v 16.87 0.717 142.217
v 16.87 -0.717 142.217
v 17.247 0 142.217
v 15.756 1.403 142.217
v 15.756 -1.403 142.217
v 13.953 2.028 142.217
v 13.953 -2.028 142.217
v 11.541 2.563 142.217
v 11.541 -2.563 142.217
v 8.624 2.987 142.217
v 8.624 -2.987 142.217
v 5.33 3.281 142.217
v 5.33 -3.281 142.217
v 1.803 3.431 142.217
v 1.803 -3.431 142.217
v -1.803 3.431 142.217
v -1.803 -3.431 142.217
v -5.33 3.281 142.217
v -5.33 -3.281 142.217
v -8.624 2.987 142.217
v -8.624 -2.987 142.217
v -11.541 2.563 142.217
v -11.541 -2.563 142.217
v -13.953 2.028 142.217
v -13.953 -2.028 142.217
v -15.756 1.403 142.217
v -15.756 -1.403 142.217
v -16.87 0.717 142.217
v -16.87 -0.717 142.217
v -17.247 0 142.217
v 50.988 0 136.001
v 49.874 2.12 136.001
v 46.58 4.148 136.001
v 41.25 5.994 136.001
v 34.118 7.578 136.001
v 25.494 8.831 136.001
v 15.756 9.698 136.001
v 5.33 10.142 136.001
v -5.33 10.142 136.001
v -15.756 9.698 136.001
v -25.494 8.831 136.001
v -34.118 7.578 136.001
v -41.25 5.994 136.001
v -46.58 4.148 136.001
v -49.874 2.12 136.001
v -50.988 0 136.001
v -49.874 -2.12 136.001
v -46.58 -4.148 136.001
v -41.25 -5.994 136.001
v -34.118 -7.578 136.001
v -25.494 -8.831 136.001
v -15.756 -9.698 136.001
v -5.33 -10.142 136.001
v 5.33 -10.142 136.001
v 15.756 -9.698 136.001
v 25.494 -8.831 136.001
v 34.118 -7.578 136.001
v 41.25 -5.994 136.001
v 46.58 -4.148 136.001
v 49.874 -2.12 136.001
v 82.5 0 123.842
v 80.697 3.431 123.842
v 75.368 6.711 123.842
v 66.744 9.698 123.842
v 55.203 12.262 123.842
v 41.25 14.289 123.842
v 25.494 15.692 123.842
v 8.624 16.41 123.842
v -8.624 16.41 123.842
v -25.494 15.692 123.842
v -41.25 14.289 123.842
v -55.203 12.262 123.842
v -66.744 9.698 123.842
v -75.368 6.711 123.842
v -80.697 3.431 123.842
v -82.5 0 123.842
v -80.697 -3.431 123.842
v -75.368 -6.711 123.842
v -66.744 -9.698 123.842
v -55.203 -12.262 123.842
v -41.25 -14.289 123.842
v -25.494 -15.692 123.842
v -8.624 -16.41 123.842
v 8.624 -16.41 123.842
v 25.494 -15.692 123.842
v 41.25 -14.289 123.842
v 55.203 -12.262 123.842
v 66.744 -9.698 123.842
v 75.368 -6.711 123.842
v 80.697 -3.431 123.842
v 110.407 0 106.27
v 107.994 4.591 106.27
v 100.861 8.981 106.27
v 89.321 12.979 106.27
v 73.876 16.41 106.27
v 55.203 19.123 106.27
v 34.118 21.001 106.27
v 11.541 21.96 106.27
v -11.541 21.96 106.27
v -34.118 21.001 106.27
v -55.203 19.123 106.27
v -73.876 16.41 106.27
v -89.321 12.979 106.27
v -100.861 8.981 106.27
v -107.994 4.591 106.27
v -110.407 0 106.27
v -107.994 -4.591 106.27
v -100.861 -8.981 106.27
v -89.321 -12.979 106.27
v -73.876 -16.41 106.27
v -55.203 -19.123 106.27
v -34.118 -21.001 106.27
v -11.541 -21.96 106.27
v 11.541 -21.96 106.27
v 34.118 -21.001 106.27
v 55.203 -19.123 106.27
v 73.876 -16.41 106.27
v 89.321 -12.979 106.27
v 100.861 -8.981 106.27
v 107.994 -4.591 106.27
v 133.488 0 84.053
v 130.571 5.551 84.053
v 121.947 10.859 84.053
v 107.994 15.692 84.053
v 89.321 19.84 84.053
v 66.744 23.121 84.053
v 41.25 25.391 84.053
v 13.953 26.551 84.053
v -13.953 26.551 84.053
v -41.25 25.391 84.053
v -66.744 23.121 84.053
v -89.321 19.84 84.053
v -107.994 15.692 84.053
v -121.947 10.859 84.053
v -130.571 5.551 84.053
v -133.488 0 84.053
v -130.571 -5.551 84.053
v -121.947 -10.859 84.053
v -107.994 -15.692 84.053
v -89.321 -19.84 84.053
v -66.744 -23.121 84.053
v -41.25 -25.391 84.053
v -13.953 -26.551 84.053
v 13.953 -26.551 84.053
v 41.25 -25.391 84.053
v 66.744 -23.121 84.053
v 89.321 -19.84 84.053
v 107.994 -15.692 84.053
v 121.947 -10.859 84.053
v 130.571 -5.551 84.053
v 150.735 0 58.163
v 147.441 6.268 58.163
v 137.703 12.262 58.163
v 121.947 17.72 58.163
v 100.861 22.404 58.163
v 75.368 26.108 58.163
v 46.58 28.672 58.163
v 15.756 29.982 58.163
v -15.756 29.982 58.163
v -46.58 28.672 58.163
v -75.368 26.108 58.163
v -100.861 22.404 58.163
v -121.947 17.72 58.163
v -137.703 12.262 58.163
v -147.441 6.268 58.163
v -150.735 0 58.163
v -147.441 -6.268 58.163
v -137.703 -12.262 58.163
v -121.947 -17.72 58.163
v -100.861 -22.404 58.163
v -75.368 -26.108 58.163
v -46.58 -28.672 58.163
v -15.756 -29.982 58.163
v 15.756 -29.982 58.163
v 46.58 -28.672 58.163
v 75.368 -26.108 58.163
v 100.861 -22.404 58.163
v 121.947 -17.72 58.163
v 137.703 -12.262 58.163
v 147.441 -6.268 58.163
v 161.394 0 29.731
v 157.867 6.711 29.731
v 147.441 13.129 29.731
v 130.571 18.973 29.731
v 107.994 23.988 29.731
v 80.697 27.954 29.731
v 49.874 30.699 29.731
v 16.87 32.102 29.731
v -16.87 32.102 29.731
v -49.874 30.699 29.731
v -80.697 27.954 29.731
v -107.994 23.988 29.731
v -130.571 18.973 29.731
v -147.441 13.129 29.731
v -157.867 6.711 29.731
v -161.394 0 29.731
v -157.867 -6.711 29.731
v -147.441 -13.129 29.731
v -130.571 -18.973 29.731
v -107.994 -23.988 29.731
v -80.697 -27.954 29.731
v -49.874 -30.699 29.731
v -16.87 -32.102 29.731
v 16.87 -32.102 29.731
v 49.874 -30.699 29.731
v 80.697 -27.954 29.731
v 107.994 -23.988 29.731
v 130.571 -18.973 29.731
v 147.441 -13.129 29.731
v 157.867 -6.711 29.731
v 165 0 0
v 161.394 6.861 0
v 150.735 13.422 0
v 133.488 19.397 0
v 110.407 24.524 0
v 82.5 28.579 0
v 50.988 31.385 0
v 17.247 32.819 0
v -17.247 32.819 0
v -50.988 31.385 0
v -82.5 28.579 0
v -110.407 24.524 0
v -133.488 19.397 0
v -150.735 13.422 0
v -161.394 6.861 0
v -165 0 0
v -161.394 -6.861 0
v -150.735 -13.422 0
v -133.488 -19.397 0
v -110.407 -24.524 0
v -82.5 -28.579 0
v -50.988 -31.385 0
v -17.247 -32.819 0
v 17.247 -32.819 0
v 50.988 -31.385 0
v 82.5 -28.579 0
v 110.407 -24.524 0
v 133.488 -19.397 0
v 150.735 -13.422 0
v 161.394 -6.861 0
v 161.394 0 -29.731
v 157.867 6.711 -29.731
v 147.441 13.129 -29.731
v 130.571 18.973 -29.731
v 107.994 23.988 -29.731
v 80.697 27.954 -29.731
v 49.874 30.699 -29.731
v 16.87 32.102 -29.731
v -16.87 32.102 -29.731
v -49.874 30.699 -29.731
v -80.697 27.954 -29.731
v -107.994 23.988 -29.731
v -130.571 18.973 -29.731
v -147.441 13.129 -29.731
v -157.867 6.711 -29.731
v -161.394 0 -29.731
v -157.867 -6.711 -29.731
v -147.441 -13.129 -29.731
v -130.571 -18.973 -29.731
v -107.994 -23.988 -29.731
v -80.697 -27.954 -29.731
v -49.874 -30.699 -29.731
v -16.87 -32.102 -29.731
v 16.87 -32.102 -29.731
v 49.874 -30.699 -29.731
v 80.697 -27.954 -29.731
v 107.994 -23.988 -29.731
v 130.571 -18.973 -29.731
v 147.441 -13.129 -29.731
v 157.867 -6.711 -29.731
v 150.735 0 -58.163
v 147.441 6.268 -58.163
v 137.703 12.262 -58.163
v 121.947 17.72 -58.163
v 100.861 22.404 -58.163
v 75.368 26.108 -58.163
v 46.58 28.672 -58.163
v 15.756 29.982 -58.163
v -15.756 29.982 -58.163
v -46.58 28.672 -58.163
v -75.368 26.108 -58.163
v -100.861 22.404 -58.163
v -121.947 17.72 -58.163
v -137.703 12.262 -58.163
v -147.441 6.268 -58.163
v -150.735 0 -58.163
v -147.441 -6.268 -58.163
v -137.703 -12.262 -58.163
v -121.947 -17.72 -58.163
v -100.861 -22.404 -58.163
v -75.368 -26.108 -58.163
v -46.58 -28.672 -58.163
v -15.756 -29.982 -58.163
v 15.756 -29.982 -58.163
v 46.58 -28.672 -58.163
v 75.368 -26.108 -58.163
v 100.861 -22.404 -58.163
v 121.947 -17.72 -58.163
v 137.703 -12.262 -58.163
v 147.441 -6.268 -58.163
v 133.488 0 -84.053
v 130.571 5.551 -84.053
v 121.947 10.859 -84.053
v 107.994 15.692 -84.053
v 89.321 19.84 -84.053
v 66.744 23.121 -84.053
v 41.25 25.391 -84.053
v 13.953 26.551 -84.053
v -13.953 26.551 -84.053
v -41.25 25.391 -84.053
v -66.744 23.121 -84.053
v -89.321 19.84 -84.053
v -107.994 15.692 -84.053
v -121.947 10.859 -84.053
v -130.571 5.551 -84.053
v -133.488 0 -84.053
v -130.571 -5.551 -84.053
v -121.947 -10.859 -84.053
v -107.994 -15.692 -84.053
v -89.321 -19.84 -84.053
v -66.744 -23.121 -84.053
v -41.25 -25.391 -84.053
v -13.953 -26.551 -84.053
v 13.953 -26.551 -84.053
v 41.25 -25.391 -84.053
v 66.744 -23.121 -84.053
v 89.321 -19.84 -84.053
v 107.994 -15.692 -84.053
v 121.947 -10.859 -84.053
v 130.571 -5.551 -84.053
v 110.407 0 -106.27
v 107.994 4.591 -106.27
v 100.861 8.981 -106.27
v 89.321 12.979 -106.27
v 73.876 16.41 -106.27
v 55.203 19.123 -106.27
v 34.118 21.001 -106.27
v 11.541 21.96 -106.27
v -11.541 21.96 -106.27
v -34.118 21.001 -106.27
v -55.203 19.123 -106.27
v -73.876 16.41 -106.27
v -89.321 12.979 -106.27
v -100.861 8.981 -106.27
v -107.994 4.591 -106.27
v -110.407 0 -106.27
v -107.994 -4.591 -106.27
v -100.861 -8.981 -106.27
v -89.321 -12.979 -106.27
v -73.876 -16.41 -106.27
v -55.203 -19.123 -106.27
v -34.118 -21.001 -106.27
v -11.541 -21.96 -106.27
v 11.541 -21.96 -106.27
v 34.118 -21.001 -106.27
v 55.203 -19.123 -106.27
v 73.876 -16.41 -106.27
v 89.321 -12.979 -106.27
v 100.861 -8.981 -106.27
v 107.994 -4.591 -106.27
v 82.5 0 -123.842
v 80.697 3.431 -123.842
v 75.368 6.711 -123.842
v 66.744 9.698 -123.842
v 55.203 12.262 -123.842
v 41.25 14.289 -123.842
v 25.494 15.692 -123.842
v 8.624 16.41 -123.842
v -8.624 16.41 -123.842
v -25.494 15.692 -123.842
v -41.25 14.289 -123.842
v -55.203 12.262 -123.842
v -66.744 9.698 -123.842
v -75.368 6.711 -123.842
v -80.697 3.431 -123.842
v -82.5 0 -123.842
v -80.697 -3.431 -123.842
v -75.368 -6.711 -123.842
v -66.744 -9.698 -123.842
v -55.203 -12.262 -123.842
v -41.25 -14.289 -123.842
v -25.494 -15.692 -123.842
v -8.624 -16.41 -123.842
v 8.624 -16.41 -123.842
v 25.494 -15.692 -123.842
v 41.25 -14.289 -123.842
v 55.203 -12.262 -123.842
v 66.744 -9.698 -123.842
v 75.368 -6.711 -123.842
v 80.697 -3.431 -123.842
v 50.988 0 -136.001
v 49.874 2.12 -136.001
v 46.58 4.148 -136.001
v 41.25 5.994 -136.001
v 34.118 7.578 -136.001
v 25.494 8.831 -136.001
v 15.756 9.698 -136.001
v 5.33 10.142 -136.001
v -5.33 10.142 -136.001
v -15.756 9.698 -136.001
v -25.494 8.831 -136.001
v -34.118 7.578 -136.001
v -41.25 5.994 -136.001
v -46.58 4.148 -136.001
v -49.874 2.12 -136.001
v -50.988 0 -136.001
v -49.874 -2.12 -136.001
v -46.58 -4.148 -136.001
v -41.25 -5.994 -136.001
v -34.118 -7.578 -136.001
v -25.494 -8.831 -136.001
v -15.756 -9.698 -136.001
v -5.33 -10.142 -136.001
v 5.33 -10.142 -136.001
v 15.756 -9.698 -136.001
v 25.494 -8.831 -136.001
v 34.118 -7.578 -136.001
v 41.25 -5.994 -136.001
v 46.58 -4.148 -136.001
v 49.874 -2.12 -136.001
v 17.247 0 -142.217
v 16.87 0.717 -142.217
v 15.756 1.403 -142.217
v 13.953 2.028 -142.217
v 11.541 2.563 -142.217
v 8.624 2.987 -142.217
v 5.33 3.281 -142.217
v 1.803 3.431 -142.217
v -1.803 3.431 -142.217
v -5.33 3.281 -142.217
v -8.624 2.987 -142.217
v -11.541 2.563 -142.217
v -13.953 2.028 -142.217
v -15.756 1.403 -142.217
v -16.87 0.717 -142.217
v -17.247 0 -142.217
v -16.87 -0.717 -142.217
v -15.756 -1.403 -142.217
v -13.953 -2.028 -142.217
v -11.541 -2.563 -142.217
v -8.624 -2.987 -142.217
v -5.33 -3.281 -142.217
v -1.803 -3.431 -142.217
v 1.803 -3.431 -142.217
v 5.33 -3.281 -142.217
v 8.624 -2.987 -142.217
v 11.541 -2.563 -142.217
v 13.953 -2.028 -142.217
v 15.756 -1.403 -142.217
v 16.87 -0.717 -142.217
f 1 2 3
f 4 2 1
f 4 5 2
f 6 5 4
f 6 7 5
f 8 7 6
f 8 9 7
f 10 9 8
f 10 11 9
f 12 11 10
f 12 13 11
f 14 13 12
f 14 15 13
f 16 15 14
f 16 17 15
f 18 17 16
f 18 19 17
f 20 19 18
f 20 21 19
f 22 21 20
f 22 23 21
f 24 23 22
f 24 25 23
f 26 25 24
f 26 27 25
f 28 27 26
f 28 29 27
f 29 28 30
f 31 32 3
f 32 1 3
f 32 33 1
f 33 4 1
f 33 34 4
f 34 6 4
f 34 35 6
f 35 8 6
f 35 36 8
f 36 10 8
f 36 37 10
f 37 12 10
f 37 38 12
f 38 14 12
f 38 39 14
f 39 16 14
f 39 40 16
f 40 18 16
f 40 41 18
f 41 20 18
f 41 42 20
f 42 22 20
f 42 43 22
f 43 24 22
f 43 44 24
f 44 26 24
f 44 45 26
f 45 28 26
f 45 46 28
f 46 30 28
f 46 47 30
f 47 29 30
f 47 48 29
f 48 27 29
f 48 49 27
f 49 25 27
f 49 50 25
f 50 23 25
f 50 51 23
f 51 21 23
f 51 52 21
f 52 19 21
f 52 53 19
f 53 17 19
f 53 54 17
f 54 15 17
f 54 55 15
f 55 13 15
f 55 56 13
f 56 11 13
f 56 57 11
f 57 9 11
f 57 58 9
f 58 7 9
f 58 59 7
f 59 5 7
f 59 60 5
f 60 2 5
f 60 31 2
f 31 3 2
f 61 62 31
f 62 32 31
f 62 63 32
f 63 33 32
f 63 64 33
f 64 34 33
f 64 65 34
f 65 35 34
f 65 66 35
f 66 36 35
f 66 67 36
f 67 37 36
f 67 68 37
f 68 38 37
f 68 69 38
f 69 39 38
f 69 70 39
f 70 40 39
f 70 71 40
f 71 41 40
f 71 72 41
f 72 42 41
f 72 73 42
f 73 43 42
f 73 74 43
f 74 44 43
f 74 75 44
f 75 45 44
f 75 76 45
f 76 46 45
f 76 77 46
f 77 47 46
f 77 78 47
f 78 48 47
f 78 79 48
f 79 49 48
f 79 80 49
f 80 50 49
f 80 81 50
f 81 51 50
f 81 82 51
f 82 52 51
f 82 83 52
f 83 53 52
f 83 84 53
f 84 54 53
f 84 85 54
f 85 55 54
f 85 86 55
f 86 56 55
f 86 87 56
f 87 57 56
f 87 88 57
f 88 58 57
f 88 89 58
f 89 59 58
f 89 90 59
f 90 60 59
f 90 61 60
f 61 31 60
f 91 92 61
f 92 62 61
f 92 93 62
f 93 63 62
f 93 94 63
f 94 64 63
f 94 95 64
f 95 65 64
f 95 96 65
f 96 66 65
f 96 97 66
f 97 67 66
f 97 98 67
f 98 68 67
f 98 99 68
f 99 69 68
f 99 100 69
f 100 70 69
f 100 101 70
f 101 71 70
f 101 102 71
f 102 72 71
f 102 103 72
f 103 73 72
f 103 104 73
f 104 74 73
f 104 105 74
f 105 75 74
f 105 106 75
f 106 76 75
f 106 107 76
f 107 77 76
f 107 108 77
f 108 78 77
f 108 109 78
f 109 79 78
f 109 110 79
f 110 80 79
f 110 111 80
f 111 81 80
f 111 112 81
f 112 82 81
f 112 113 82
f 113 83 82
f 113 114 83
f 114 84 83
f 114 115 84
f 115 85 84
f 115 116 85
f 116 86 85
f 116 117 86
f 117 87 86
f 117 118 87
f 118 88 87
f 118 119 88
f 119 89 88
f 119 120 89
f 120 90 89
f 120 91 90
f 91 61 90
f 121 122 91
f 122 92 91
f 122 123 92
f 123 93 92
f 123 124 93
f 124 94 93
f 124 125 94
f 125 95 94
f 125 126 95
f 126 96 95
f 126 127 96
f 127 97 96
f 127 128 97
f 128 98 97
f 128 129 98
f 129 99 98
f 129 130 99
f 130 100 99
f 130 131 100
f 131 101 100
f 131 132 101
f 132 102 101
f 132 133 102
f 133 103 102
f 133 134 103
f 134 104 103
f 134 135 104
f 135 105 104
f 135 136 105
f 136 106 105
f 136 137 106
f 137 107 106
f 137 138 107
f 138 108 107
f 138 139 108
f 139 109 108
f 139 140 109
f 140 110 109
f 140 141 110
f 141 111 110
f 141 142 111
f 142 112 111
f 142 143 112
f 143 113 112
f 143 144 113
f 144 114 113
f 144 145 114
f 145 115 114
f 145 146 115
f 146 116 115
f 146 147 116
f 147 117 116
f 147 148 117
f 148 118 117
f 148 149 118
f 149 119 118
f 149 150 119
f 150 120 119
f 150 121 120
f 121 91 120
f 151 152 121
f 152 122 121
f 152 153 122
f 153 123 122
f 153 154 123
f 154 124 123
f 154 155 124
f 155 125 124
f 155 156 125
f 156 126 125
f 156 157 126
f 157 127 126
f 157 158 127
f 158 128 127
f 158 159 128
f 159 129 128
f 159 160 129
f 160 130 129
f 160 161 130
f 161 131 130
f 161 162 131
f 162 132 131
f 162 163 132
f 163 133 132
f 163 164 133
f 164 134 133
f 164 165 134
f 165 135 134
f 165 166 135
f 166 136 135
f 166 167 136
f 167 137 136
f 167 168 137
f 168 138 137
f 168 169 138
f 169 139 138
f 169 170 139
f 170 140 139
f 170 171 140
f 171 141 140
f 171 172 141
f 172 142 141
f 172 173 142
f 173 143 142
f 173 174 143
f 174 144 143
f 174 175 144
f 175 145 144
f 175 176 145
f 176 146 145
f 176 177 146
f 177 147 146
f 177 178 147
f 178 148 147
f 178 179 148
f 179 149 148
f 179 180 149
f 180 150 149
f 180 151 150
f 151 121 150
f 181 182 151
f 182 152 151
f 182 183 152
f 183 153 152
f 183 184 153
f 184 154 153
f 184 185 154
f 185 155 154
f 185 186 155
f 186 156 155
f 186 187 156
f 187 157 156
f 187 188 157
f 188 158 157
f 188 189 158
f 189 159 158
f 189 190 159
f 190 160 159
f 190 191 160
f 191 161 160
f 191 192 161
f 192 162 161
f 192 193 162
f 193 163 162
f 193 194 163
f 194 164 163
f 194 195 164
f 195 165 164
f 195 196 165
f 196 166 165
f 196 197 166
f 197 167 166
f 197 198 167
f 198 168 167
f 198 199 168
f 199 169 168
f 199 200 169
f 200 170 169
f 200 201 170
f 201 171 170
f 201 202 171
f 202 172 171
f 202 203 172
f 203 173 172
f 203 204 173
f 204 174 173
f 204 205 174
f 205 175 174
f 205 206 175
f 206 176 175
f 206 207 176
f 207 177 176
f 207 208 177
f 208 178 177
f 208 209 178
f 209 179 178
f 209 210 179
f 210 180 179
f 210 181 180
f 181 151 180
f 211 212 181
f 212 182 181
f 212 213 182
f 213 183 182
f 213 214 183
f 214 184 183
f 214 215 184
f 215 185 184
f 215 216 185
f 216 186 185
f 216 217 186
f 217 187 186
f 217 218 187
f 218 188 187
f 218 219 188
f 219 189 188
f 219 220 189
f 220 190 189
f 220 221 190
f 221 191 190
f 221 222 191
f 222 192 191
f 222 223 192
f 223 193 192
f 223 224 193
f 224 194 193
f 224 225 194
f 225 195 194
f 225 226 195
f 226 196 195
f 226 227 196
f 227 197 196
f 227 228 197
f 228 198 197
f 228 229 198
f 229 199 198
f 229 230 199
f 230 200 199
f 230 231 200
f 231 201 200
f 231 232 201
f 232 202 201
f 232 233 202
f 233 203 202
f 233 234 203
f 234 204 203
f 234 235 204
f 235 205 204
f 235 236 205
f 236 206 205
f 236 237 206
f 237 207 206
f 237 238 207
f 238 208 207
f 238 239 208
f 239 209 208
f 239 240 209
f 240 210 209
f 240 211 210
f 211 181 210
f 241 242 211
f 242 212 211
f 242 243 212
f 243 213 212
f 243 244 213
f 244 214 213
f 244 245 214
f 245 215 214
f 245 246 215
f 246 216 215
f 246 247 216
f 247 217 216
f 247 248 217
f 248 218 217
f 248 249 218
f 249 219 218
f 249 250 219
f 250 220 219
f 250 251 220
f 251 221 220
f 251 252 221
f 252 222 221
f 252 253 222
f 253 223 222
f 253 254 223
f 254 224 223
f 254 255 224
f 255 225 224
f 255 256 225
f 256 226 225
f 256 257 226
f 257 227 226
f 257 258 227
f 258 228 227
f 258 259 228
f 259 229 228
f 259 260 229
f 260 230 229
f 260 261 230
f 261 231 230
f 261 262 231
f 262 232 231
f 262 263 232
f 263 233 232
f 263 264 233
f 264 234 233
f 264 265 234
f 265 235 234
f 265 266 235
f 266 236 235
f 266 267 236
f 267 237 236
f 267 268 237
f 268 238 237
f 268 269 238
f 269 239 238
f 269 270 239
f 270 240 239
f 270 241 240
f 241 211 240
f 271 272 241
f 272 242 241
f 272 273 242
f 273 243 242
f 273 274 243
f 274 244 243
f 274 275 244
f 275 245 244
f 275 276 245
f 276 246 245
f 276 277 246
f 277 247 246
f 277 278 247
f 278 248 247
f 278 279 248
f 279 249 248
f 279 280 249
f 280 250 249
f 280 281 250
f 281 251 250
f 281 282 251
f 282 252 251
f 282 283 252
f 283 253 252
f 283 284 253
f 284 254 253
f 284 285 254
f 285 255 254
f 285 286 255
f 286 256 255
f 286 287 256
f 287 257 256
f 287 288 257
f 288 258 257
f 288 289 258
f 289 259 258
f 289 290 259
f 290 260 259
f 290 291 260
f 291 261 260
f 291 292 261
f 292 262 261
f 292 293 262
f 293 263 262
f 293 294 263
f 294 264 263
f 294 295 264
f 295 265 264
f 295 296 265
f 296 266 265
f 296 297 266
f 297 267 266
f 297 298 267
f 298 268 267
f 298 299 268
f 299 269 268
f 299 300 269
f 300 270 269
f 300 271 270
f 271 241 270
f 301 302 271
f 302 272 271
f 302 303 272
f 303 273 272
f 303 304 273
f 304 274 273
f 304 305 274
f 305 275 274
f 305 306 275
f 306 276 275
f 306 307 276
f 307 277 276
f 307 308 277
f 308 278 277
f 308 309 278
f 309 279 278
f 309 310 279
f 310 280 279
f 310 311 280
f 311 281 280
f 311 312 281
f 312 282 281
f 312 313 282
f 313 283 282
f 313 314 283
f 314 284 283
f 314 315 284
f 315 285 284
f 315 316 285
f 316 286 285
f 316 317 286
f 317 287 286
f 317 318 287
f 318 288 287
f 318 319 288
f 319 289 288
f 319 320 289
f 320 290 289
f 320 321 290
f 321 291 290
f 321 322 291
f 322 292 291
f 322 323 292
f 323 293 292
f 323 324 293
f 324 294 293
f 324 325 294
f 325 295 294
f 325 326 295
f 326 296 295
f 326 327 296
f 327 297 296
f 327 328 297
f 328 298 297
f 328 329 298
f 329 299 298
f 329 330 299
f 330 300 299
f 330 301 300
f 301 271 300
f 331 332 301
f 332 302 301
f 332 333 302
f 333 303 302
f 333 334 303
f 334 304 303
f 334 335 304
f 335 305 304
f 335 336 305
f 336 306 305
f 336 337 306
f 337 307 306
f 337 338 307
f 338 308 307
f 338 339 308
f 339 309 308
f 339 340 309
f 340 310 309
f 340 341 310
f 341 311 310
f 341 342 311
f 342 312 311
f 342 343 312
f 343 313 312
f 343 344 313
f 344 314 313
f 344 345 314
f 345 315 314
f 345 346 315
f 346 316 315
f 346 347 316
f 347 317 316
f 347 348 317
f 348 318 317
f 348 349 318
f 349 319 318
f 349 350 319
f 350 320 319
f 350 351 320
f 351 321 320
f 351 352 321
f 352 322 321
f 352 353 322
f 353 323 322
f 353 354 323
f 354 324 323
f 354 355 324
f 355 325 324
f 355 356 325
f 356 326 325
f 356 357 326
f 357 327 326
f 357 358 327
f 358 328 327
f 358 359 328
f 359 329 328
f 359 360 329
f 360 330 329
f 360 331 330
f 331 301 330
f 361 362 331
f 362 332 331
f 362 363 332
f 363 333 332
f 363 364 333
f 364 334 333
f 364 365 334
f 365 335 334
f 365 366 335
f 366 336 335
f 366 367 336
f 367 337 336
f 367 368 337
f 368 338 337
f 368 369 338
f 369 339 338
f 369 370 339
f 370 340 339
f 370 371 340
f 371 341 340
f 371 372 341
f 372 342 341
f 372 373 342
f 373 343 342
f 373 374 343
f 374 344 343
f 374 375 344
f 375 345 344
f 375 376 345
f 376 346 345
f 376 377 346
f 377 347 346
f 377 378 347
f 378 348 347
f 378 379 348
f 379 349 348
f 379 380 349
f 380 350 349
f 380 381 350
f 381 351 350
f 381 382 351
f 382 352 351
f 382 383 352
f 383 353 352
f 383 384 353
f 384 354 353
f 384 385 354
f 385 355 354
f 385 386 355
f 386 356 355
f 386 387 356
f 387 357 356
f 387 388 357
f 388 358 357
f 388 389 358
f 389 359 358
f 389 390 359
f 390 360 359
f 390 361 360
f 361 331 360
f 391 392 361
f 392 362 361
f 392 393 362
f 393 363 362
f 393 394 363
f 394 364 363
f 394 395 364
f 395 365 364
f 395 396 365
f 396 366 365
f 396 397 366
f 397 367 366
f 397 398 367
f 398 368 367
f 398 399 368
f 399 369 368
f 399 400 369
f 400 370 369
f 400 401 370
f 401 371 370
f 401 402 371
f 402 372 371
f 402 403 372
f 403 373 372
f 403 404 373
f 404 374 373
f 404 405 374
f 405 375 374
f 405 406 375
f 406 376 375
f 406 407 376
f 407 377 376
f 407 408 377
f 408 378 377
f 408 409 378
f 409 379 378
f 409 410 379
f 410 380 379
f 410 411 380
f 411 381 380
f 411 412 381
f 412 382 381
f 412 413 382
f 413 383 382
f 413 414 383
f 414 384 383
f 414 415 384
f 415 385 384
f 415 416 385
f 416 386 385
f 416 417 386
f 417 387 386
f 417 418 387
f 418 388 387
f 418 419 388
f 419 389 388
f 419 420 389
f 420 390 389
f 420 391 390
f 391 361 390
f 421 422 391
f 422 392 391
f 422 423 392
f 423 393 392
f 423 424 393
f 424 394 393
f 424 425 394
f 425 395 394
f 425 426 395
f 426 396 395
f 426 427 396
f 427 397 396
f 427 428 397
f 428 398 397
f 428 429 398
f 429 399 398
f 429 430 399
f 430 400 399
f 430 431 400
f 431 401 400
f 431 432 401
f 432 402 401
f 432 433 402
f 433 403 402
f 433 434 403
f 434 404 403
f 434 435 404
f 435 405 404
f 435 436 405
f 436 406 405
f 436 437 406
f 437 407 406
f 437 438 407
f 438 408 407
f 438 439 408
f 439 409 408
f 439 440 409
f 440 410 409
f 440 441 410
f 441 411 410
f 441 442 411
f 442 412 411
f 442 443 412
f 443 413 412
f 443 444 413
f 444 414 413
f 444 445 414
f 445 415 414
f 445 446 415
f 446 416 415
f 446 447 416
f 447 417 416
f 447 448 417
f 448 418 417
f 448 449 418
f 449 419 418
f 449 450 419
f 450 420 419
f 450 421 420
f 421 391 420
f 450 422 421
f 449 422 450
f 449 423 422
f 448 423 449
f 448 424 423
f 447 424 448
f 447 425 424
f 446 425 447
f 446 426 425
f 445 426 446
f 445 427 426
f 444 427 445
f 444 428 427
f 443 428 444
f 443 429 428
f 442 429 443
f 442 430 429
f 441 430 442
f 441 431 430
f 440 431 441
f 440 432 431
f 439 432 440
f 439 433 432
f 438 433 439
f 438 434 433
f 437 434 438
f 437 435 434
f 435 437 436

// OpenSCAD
// Generated by SolidPython 1.0.1 on 2020-07-29 00:46:51


scale(v = [15, 3, 13]) {
	sphere(r = 11);
}
/***********************************************
*********      SolidPython code:      **********
************************************************
 
# import packages: SolidPython
from solid import *
from solid.utils import *
from itertools import chain, combinations, permutations


class Resize:

    def __init__(self, scad_file):
        self.scad_file = scad_file
        #self.scad_file = import_scad(scad_file)
        # cone/cylinder param:
        self.r1 = 0
        self.r2 = 0
        self.h = 0
        # rectangular prism param:
        self.w = 0
        self.l = 0
        # ellipse param:
        self.r = 0

    # import OpenScad code (file name corresponds to shape)


    # classify shape + parameters
    def assign(self, param1, param2, param3):
        if self.scad_file == 'cone.scad':
            self.r1 = param1
            self.r2 = param2
            self.h = param3
        elif self.scad_file == 'cylinder.scad':
            self.r1 = param1
            self.r2 = param2
            self.h = param3
        elif self.scad_file == 'rectangularPrism.scad':
            self.h = param1
            self.l = param2
            self.w = param3
        else:
            self.r = param1
            self.h = param2

    # resize parameters
    def iterate(self):
        x = range(3, 20, 2)
        i = 1
        if self.scad_file == 'cone.scad':
            tempList = list(permutations(x, 2))
            for temp in tempList:
                param1 = temp[0]
                param2 = temp[1]
                filepath = 'produced_scad_files/' + 'cone' + str(param1) + '_' + str(param2) + '_' + '.scad'
                scad_render_to_file(cylinder(h=param1, r1=param2, r2=0), filepath)

        elif self.scad_file == 'cylinder.scad':
            tempList = list(permutations(x, 3))
            for temp in tempList:
                param1 = temp[0]
                param2 = temp[1]
                filepath = 'produced_scad_files/' + 'cylinder' + str(param1) + '_' + str(param2) + '_' + '.scad'
                scad_render_to_file(cylinder(h=param1, r1=param2, r2=param2), filepath)

        elif self.scad_file == 'rectangularPrism.scad':
            tempList = list(permutations(x, 3))
            for temp in tempList:
                param1 = temp[0]
                param2 = temp[1]
                param3 = temp[2]
                filepath = 'produced_scad_files/' + 'rectangularPrism' + str(param1) + '_' + str(param2) + '_' + str(
                    param3) + '.scad'
                scad_render_to_file(cube(size=(param1, param2, param3)), filepath)

        elif self.scad_file == 'ellipse.scad':
            tempList = list(permutations(x, 4))
            for temp in tempList:
                param1 = temp[0]
                param2 = temp[1]
                param3 = temp[2]
                param4 = temp[3]
                filepath = 'produced_scad_files/' + 'ellipse' + str(param1) + '_' + str(param2) + '_' + str(param3) + '_' + str(param4) + '.scad'
                scad_render_to_file(scale([param1, param2, param3])(sphere(r=param4)), filepath)

    def render_to_scadfile(self):
        scad_render_to_file(scad, 'example.scad') 
 
************************************************/
